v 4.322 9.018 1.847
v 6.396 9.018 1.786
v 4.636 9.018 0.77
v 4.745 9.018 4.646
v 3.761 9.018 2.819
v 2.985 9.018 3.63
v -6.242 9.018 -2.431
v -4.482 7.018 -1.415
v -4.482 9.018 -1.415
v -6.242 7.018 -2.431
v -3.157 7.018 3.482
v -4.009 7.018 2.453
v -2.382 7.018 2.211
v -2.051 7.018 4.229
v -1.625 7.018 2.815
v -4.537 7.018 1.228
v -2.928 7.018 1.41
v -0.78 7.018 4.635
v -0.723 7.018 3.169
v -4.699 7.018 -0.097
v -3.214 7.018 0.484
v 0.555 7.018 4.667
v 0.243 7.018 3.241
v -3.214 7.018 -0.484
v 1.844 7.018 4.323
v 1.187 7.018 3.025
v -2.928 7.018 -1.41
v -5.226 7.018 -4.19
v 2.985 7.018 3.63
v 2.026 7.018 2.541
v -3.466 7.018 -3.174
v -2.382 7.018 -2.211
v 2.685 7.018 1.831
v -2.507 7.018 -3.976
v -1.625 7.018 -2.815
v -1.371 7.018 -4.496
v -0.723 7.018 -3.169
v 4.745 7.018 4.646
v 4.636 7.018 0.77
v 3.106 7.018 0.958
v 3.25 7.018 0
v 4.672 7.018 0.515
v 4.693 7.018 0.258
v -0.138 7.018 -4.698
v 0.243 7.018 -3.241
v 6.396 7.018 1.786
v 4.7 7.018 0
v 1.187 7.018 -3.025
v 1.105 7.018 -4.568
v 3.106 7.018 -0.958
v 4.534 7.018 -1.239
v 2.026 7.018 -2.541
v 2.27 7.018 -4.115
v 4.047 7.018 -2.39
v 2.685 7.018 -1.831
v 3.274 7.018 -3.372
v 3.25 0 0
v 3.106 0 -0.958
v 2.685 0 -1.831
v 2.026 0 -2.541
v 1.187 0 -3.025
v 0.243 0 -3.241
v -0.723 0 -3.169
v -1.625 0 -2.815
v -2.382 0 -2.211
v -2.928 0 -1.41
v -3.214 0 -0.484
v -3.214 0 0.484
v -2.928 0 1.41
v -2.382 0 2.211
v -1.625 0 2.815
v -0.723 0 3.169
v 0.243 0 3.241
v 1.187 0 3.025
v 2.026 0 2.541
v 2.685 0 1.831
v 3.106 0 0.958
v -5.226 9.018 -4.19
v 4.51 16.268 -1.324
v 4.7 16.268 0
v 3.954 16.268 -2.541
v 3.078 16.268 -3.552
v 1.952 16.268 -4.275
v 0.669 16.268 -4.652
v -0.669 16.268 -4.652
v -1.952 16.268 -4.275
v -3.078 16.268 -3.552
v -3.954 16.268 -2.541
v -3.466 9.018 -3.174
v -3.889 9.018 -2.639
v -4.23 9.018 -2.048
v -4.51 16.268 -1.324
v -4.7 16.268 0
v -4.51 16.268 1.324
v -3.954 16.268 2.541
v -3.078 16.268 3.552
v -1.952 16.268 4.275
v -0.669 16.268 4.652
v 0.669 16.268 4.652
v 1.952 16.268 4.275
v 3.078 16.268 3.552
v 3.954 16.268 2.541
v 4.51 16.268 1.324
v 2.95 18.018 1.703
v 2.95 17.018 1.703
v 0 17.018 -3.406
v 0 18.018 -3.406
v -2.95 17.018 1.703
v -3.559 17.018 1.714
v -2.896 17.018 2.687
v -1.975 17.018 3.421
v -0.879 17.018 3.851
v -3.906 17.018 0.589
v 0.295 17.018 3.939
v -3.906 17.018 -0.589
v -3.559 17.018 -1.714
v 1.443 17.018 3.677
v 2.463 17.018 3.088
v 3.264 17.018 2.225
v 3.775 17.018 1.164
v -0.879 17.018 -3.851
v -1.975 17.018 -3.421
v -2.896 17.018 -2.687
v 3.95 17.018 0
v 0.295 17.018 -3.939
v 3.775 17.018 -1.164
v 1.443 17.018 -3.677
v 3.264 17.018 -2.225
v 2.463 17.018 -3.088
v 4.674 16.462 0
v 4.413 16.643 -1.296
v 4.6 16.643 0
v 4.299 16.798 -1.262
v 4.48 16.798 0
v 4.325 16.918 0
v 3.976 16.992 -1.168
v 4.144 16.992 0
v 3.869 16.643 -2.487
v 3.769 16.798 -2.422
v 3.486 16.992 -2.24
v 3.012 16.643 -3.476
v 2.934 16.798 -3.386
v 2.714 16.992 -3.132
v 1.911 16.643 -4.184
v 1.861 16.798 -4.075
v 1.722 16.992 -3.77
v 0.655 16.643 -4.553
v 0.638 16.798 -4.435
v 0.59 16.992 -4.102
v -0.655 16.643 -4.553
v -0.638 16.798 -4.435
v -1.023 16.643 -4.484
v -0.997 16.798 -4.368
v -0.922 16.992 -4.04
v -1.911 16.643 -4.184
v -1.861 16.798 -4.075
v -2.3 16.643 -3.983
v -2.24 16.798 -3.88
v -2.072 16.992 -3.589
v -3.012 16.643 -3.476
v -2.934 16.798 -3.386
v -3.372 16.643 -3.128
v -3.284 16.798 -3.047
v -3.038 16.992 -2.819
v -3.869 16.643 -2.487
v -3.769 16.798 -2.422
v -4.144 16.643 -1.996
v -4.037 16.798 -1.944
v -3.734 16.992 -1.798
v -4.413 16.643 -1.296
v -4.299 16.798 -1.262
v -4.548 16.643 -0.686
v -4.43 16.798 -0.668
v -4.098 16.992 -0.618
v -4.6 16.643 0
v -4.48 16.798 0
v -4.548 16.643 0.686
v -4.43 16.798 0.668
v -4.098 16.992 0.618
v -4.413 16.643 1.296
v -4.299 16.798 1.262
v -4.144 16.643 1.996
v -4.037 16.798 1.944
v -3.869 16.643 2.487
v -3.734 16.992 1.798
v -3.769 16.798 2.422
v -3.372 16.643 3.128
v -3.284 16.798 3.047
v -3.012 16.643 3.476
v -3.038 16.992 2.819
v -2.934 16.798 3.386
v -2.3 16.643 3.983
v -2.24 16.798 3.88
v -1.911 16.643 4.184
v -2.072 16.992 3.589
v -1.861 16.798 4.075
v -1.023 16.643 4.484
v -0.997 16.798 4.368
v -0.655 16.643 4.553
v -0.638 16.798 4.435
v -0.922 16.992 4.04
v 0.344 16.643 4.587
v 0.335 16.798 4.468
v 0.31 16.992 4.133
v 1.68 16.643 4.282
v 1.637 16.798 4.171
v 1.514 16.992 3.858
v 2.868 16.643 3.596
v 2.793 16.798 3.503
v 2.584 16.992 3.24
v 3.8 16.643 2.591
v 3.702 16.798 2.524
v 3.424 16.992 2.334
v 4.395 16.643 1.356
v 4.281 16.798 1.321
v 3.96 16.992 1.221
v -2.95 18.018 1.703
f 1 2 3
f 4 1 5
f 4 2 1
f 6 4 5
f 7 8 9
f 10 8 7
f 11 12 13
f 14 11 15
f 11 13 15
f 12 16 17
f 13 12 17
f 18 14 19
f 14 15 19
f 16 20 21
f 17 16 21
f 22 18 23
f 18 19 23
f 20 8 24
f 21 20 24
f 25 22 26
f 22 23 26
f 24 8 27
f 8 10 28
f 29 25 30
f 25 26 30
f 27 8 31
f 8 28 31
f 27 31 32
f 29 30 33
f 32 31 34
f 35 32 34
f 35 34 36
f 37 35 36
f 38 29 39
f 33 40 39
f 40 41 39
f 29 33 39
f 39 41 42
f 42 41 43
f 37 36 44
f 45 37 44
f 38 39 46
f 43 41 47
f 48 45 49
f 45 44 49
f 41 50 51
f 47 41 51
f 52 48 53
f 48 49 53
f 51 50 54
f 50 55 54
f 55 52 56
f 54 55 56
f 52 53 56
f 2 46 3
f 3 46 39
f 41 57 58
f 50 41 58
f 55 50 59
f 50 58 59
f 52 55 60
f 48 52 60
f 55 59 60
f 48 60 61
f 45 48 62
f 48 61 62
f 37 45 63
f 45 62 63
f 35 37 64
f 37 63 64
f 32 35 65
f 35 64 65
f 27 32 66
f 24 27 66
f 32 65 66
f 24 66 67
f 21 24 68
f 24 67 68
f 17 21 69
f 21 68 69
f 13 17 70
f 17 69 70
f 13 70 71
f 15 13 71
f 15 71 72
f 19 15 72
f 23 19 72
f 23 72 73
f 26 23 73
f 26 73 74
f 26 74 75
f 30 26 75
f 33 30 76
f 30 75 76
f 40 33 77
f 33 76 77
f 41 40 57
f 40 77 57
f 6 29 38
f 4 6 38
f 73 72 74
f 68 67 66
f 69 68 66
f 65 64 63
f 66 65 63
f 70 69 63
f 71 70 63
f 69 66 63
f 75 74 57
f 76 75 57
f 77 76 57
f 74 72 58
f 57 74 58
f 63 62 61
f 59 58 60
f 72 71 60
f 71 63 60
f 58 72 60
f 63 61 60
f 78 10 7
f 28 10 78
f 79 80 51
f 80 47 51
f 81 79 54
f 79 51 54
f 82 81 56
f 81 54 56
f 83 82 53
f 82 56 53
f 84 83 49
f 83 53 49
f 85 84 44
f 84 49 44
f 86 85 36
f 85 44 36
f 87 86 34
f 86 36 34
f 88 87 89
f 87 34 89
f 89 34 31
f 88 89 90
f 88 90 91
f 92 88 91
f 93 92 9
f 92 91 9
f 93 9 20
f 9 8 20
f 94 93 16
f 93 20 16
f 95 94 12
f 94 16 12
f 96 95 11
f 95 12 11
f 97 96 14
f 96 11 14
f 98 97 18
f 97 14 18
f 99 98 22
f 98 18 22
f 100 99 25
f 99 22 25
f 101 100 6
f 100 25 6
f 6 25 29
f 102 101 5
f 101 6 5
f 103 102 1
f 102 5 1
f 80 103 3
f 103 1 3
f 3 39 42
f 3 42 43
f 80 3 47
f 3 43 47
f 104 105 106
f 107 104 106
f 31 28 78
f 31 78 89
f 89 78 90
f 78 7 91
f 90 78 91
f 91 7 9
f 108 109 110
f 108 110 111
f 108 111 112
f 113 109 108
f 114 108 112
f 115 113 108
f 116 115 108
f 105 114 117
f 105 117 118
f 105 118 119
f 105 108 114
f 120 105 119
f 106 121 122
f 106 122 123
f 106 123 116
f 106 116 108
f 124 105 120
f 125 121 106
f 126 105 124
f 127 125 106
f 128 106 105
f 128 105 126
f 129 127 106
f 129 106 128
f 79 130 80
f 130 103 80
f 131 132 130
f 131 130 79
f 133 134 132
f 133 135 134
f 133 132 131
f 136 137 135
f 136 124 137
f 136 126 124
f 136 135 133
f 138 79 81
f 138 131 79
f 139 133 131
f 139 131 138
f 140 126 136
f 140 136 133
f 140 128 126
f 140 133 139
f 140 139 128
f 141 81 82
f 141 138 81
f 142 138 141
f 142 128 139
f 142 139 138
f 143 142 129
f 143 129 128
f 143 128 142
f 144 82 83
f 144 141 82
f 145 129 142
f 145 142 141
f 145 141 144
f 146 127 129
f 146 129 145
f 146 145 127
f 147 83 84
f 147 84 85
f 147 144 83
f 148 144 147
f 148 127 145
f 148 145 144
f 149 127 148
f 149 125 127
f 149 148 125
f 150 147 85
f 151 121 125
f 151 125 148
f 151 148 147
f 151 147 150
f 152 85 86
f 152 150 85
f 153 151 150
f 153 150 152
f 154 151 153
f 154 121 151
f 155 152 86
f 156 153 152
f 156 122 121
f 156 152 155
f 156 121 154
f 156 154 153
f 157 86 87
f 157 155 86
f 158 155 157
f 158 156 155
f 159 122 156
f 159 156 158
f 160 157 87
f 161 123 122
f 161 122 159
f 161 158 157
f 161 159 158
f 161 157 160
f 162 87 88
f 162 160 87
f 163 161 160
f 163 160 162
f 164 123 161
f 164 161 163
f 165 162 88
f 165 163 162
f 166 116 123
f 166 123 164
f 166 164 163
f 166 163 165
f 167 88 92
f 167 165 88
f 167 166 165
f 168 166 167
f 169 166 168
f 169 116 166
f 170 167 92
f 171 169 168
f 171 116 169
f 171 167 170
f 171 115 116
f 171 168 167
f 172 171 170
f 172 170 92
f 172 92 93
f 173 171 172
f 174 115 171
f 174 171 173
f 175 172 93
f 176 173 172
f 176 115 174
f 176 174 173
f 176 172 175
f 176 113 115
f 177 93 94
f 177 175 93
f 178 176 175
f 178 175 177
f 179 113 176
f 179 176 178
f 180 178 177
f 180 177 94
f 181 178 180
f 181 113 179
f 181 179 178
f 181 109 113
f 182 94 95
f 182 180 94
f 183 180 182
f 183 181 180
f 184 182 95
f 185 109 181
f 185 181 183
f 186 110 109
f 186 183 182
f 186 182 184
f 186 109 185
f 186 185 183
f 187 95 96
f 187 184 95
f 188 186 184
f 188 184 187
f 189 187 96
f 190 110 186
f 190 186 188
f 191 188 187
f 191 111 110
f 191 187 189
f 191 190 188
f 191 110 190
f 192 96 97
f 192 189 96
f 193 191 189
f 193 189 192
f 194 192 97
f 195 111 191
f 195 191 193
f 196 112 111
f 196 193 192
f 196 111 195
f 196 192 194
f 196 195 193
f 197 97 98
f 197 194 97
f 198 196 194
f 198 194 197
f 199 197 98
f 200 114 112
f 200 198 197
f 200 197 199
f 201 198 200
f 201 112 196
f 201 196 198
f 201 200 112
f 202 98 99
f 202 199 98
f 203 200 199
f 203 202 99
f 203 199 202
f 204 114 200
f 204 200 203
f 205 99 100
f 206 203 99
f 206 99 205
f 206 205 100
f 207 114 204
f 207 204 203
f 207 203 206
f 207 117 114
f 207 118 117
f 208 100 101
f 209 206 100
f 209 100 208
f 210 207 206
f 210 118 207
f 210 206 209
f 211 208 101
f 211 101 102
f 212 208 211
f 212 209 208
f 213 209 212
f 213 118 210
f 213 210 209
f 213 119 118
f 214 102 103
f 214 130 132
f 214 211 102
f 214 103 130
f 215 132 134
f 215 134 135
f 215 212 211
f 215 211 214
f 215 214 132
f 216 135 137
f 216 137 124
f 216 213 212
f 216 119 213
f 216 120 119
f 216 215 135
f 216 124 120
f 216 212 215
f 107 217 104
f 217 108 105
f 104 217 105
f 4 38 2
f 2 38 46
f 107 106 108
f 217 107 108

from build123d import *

# Parameters (mm, degrees)
SKETCH1_R           = 3.25
BOSS_EXTRUDE1_DEPTH = 7.018
SKETCH6_R           = 4.7
BOSS_EXTRUDE2_DEPTH = 10
BOSS_EXTRUDE5_DEPTH = 1
FILLET1_R           = 0.75
BOSS_EXTRUDE6_DEPTH = 2


with BuildPart() as part:
    # Sketch1 → Boss-Extrude1 (new body)
    with BuildSketch(Plane(origin=(0, 0, 0), x_dir=(1, 0, 0), z_dir=(0, 1, 0))):
        Circle(SKETCH1_R)
    extrude(amount=BOSS_EXTRUDE1_DEPTH)

    # Sketch6 → Boss-Extrude2 (add)
    with BuildSketch(Plane(origin=(0, 7.018, 0), x_dir=(1, 0, 0), z_dir=(0, 1, 0))):
        Circle(SKETCH6_R)
    extrude(amount=BOSS_EXTRUDE2_DEPTH)

    # Sketch7 → Boss-Extrude5 (add)
    with BuildSketch(Plane(origin=(0, 17.018, 0), x_dir=(1, 0, 0), z_dir=(0, 1, 0))):
        Polygon((2.95, -1.703183294), (0, 3.406366588), (-2.95, -1.703183294), align=None)
    extrude(amount=BOSS_EXTRUDE5_DEPTH)

    # Fillet1
    fillet1_edges = [part.edges().sort_by_distance(p)[0] for p in [
        (-4.7, 17.018, 0),
    ]]
    fillet(fillet1_edges, radius=FILLET1_R)

    # Sketch8 → Boss-Extrude6 (add)
    with BuildSketch(Plane.XZ.offset(-7.018)):
        with BuildLine():
            Line((-4.482079516, -1.414554068), (-6.241843137, -2.430554068))
            Line((-6.241843137, -2.430554068), (-5.225843137, -4.190317689))
            Line((-5.225843137, -4.190317689), (-3.466079516, -3.174317689))
            ThreePointArc((-3.466079516, -3.174317689), (-4.070319398, -2.35), (-4.482079516, -1.414554068))
        make_face()
        with BuildLine():
            Line((2.985424986, 3.630046508), (4.745188607, 4.646046508))
            Line((4.745188607, 4.646046508), (6.396188607, 1.786430625))
            Line((6.396188607, 1.786430625), (4.636424986, 0.770430625))
            ThreePointArc((4.636424986, 0.770430625), (4.070319398, 2.35), (2.985424986, 3.630046508))
        make_face()
    extrude(amount=-BOSS_EXTRUDE6_DEPTH)


solid = part.part
